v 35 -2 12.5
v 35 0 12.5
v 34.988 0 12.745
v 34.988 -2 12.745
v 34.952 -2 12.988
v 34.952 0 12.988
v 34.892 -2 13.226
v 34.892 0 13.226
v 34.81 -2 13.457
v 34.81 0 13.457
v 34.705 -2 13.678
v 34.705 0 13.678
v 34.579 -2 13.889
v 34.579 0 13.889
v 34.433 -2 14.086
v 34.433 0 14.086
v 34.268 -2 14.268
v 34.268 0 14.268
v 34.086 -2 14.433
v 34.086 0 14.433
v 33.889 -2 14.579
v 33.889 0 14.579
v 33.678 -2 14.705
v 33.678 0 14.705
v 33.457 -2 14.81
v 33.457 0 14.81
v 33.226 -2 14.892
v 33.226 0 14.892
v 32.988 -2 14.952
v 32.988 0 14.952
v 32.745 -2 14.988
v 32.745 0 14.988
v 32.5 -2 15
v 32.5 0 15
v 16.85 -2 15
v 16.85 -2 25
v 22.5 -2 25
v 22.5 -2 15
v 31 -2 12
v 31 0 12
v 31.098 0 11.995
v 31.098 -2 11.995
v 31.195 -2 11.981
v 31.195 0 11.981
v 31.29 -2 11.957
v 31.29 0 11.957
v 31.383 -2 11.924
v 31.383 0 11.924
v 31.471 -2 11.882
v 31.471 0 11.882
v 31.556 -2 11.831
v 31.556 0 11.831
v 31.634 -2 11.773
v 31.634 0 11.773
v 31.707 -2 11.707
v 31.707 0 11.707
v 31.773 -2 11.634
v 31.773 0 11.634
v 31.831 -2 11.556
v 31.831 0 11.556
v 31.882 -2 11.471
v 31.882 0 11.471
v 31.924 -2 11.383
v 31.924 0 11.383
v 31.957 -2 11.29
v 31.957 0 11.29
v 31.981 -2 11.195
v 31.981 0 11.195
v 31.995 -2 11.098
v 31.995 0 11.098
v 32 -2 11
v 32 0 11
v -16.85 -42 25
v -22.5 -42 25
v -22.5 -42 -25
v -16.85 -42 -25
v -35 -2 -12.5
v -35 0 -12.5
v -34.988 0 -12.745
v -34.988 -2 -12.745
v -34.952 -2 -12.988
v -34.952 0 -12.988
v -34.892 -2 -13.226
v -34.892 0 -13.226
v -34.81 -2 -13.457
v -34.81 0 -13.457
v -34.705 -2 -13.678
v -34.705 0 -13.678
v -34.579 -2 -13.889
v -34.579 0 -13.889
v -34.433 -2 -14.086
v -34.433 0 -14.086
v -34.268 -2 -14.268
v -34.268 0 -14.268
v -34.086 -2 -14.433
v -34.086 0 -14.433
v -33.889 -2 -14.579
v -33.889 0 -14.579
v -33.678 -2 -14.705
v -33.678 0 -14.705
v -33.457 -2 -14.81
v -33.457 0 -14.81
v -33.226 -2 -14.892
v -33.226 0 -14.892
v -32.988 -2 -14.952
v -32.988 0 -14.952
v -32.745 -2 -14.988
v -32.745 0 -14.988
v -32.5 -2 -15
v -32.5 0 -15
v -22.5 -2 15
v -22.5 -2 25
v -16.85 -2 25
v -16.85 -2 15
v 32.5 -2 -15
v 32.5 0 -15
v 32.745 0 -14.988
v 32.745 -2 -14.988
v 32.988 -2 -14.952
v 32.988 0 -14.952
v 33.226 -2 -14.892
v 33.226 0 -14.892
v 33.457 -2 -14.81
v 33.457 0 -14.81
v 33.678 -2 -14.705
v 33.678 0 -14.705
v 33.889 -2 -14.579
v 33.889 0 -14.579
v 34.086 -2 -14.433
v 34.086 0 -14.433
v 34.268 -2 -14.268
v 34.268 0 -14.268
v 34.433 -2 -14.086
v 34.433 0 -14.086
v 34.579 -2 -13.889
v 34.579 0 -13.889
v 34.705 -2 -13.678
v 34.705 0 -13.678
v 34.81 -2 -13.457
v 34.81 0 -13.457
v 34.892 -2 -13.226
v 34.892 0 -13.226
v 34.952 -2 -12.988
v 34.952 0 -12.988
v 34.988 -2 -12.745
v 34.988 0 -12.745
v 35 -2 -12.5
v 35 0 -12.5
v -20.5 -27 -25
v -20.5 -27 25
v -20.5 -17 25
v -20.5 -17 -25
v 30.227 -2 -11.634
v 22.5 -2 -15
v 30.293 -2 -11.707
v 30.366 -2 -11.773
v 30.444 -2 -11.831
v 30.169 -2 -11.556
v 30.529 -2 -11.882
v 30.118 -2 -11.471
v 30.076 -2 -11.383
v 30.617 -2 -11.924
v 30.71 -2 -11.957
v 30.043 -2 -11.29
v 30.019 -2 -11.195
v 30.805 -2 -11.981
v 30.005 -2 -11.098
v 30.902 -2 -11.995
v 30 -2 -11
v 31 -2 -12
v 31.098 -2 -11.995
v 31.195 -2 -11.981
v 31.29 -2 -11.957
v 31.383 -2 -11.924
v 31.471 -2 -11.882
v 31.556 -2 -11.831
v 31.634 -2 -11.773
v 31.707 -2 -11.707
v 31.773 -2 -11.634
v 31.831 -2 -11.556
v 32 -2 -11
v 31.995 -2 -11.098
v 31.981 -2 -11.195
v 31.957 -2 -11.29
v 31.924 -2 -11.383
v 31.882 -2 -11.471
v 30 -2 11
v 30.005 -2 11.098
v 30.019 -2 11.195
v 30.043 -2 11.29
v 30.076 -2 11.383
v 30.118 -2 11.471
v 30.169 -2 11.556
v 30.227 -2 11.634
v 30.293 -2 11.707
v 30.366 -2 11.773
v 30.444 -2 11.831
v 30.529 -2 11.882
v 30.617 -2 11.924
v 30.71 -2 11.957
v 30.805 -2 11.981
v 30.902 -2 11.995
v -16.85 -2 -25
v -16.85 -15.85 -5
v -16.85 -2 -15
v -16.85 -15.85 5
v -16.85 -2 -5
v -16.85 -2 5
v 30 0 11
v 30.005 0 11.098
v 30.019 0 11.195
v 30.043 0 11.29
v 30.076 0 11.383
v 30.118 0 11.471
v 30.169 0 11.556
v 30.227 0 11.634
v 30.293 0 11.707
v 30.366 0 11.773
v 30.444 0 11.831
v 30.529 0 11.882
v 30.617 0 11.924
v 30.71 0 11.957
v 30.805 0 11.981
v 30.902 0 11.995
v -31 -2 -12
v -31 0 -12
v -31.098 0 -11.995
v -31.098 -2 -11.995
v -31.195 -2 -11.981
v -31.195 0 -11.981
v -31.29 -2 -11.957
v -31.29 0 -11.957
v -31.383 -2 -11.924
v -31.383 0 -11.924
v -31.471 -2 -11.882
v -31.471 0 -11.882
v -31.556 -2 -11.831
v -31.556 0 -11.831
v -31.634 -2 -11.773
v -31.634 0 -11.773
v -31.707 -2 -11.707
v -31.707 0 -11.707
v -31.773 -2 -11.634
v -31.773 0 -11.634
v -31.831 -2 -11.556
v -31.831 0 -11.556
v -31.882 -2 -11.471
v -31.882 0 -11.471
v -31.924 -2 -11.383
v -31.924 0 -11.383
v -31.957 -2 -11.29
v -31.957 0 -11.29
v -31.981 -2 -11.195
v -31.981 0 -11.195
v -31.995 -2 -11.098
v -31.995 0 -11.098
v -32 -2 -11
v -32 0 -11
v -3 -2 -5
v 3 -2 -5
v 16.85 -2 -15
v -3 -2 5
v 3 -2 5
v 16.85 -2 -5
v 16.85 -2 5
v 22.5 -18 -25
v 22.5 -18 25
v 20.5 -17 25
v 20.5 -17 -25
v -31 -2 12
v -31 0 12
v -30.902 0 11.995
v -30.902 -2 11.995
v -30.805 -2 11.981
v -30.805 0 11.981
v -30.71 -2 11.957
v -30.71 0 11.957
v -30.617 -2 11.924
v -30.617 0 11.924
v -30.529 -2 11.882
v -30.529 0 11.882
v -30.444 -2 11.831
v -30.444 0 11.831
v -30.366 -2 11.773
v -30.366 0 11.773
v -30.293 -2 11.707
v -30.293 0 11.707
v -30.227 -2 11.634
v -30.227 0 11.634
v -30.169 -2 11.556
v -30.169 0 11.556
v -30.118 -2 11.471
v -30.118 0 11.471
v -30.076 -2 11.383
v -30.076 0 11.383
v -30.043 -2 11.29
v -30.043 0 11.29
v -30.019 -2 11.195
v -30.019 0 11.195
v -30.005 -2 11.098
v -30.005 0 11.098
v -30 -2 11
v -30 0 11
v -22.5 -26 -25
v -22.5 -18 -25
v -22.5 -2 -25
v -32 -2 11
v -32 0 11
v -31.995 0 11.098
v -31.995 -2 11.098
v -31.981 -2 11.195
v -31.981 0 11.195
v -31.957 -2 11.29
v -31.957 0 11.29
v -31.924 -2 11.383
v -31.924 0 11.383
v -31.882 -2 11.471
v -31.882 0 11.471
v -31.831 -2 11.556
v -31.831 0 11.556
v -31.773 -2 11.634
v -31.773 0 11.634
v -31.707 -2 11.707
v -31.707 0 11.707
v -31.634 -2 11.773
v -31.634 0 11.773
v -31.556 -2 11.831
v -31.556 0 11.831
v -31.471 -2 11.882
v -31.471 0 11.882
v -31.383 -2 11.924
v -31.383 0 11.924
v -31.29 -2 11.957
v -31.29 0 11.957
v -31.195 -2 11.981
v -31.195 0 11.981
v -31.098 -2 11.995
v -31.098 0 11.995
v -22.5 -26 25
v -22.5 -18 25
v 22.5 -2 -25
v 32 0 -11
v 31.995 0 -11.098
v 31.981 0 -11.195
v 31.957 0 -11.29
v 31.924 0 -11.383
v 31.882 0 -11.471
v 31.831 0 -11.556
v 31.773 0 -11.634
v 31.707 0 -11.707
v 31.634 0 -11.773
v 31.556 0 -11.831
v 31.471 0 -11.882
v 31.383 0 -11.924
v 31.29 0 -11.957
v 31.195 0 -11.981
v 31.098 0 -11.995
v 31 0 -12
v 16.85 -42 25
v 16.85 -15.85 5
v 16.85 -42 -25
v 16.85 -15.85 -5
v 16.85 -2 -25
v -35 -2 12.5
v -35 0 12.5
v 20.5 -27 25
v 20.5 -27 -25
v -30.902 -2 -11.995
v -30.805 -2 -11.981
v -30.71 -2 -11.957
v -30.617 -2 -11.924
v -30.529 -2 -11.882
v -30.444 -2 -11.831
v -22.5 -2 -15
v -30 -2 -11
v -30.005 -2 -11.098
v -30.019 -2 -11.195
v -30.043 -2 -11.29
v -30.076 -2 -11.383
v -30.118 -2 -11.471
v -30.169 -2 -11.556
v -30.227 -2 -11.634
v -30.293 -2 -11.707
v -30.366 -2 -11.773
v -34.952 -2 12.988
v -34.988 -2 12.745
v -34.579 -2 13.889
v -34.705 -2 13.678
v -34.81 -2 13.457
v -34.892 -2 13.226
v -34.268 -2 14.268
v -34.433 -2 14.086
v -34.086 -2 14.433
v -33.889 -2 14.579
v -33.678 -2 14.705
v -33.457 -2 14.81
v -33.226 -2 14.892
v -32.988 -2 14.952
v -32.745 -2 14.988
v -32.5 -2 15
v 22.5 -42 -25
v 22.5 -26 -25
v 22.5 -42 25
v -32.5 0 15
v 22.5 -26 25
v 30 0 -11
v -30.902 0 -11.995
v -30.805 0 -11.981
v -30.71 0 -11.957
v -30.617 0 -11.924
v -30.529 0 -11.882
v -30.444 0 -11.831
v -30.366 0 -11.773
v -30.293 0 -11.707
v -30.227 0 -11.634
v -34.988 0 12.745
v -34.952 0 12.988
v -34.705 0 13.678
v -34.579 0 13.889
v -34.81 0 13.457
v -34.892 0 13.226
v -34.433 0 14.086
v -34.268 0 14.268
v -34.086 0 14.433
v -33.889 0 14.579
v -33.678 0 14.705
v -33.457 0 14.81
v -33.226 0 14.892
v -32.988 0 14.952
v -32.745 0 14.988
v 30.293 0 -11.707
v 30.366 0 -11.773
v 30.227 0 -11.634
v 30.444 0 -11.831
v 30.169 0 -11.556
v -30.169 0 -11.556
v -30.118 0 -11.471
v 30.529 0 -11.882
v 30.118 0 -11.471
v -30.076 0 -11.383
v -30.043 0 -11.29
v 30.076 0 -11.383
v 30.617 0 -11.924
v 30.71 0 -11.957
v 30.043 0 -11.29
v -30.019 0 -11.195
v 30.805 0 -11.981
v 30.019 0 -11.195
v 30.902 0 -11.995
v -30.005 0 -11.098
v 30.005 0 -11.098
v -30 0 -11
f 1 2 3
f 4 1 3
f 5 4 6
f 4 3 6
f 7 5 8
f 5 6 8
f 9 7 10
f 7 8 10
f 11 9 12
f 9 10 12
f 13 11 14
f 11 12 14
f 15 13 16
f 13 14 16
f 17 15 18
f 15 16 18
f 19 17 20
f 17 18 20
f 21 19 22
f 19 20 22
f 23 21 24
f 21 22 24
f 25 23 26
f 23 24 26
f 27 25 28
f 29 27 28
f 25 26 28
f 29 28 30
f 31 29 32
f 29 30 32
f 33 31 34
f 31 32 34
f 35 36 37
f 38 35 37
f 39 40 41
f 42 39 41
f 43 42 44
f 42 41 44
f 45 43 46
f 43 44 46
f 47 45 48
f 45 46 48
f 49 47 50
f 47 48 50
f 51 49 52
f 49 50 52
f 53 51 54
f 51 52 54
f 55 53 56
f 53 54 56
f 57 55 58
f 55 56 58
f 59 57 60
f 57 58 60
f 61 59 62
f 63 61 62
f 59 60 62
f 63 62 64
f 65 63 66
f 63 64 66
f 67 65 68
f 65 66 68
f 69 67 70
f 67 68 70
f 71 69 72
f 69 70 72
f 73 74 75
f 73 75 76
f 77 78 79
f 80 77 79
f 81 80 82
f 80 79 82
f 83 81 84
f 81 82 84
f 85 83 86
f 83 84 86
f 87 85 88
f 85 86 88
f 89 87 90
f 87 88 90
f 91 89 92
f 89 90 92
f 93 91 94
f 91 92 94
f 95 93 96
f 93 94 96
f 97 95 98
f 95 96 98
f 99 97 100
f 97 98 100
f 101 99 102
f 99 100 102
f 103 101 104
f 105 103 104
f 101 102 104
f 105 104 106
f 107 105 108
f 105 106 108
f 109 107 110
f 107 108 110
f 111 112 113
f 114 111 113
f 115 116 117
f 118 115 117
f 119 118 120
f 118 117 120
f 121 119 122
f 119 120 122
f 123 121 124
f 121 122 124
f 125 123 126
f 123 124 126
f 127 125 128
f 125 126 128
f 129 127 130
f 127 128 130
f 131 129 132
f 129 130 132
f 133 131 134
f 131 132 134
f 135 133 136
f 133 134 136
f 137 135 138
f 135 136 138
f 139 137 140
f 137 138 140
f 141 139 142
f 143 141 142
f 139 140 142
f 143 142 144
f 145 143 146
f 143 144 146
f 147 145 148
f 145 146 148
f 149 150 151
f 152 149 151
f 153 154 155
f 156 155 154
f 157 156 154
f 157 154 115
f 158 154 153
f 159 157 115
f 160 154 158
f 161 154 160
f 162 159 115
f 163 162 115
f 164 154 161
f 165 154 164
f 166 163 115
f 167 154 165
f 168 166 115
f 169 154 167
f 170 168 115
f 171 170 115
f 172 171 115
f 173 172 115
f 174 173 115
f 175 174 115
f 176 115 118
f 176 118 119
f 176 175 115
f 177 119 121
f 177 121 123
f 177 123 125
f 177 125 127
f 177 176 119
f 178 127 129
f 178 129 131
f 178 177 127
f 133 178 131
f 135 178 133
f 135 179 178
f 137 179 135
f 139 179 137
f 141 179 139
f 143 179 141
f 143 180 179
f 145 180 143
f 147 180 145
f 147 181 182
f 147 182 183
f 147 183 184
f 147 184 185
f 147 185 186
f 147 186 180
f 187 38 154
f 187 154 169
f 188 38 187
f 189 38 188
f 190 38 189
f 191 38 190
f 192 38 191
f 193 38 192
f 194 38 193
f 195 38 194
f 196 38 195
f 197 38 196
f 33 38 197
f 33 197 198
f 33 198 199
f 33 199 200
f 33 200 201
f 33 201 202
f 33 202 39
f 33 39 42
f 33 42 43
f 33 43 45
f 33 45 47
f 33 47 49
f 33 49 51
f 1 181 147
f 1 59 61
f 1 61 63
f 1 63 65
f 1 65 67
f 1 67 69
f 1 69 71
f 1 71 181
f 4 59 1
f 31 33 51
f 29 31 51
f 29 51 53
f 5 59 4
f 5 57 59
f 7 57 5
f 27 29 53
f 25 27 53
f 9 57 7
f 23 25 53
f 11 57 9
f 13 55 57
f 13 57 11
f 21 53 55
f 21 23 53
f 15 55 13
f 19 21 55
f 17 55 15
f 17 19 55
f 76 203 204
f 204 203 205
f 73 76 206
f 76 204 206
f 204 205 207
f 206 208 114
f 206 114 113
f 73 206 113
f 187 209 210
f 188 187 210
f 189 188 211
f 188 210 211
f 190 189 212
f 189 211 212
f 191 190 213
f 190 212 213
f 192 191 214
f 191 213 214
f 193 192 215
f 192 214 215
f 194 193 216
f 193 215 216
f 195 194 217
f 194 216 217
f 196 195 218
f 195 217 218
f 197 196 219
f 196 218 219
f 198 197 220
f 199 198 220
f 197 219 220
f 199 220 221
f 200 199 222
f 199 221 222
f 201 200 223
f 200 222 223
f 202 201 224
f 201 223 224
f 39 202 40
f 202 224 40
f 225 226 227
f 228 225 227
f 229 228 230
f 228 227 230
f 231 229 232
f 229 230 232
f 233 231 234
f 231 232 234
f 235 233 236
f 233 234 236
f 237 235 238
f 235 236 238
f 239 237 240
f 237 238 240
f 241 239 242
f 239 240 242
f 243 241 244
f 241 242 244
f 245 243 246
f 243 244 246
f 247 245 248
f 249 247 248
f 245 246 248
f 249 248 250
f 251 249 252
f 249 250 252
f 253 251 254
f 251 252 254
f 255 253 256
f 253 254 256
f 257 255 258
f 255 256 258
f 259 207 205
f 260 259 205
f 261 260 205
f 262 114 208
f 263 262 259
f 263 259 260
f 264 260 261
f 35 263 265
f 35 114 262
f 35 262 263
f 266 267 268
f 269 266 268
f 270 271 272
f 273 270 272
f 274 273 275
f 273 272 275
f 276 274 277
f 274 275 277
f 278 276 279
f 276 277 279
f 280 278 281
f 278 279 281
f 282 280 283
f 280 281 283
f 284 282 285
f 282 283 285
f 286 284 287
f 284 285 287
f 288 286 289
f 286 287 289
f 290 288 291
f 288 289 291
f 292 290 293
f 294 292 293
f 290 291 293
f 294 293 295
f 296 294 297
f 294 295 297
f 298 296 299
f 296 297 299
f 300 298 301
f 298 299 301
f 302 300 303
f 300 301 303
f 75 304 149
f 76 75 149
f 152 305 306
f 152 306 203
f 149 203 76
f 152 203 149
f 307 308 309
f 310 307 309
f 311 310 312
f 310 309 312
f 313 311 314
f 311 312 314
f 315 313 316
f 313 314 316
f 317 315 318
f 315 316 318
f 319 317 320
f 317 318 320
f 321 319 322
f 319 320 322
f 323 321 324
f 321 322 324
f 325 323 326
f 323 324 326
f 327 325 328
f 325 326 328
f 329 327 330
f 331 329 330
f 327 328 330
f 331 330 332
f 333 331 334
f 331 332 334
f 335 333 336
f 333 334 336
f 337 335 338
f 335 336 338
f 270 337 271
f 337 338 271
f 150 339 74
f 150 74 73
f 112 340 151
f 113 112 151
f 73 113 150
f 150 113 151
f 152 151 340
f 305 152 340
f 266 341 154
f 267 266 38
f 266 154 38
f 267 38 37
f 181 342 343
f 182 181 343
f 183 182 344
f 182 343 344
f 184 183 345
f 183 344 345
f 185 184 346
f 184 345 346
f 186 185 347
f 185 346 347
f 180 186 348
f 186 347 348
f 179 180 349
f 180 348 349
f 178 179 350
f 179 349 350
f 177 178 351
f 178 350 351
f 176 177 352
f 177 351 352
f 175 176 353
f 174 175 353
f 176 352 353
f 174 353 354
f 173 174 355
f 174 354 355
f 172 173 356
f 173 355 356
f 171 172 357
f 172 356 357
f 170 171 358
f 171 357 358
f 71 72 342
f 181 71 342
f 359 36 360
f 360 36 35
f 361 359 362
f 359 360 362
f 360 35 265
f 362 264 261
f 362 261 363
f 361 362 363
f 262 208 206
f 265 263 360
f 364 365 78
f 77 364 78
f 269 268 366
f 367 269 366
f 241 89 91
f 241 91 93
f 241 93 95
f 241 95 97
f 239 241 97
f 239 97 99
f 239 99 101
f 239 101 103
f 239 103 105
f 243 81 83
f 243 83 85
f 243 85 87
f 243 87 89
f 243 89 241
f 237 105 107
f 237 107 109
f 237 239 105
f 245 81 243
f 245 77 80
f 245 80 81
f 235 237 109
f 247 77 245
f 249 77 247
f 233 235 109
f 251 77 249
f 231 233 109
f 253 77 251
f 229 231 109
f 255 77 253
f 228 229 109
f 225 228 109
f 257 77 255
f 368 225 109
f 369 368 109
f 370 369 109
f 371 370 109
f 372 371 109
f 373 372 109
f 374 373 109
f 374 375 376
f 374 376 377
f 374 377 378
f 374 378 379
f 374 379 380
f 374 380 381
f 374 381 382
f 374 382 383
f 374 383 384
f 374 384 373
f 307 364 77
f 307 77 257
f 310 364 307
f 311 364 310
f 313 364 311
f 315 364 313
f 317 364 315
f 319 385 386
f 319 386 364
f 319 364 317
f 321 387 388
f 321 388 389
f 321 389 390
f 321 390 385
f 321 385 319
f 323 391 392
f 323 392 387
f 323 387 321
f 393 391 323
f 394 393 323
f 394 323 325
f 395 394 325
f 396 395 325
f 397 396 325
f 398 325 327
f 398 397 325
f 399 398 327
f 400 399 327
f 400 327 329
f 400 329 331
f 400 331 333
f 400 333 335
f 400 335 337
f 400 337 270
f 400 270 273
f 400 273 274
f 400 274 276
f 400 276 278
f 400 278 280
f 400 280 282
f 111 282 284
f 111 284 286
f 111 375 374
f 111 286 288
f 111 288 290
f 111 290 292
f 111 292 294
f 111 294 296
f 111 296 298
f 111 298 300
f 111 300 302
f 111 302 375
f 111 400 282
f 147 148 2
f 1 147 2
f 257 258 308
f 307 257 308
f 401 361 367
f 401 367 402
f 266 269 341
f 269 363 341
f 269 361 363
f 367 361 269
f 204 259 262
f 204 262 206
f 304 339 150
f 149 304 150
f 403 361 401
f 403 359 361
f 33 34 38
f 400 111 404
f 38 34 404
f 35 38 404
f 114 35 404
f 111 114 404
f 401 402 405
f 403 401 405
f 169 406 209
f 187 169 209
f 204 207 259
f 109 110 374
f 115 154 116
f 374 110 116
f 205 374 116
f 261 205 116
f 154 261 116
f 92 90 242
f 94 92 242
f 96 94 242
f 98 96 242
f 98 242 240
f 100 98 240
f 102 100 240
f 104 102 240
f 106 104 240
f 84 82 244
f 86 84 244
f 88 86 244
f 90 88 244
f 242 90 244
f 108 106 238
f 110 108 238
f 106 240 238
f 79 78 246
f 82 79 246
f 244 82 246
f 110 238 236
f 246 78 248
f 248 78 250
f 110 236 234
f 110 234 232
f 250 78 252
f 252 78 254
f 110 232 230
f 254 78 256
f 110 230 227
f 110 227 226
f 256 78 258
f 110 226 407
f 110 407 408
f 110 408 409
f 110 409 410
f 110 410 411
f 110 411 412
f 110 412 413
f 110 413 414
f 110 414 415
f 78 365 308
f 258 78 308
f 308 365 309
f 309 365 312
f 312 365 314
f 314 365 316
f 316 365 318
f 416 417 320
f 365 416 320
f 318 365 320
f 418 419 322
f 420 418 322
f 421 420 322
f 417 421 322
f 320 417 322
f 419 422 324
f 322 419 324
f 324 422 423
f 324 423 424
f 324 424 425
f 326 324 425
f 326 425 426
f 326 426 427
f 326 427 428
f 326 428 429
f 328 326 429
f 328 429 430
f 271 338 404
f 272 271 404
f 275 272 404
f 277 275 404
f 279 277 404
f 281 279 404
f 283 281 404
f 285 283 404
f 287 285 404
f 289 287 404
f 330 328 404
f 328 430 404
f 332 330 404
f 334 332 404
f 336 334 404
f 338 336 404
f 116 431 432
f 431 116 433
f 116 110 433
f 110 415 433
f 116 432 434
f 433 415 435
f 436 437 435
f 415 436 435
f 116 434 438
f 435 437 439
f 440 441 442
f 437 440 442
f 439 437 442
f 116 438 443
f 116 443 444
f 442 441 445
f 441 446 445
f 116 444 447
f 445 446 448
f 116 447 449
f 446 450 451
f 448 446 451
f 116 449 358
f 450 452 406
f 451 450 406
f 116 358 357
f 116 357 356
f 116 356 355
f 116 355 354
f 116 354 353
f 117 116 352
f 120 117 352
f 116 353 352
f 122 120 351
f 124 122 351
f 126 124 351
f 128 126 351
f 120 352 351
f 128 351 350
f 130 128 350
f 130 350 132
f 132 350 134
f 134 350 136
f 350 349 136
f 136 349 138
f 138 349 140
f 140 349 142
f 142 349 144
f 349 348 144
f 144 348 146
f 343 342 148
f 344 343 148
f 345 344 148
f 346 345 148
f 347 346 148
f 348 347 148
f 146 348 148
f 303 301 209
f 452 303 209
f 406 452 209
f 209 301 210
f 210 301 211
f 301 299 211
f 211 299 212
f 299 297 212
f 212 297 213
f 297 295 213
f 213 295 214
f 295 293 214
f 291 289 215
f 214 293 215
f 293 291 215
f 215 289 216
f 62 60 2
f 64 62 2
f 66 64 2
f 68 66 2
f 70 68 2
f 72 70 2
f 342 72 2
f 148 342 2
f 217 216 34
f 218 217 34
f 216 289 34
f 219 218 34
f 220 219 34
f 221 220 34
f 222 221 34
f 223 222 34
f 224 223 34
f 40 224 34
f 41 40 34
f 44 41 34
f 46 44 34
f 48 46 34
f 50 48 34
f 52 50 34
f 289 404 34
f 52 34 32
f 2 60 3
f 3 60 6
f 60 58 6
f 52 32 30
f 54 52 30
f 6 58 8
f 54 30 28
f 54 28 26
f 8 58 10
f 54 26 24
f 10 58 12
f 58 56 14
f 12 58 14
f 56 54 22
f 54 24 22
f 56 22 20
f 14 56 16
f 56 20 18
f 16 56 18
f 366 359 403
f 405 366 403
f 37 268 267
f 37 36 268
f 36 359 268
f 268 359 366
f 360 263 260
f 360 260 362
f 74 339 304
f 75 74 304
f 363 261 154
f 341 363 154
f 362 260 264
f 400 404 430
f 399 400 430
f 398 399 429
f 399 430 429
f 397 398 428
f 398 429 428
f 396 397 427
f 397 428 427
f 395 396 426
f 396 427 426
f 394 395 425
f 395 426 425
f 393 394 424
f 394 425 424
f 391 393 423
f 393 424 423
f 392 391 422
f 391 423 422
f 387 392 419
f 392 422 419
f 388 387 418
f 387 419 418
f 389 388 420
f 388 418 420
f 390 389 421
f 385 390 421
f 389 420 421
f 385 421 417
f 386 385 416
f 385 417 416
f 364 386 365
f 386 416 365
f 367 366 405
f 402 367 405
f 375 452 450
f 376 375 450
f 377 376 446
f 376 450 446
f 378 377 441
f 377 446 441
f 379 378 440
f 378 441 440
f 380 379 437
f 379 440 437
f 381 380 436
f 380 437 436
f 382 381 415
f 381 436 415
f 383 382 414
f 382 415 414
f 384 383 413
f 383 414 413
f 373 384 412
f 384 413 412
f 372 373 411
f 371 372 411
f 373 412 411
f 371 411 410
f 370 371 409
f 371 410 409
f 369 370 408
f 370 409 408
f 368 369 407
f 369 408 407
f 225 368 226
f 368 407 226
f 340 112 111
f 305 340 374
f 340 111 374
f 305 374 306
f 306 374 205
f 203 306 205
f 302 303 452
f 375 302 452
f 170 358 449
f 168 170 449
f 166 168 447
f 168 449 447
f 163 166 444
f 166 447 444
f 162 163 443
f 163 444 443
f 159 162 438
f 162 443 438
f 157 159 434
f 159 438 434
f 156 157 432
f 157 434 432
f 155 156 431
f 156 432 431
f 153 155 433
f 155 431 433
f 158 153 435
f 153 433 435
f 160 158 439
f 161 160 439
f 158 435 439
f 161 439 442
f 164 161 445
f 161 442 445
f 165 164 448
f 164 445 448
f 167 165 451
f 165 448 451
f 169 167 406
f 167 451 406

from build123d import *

# Parameters (mm, degrees)
F1_DEPTH      = 2
F2_W          = 5.6501800592
F2_H          = 10
F2_H_2        = 30
F3_DEPTH      = 40
F5_DEPTH      = 50
F7_DEPTH      = 50
F8_W          = 13.8498199408
F8_H          = 10
F9_DEPTH      = 15
F10_T4_DEPTH  = 87.150489639
F10_T10_DEPTH = 87.150489639


# Not quite as in the source:
# - a fillet or chamfer that OpenCascade refuses, or shapes differently, is made with other operations: its cross-section is extruded or revolved along the edge and cut away or added


with BuildPart() as f1:
    # F0 (on Front) → F1 (new body)
    with BuildSketch(Plane.XZ):
        with BuildLine():
            Line((32.5, 15), (-32.5, 15))
            ThreePointArc((-32.5, 15), (-34.267766953, 14.267766953), (-35, 12.5))
            Line((-35, 12.5), (-35, -12.5))
            ThreePointArc((-35, -12.5), (-34.267766953, -14.267766953), (-32.5, -15))
            Line((-32.5, -15), (32.5, -15))
            ThreePointArc((32.5, -15), (34.267766953, -14.267766953), (35, -12.5))
            Line((35, -12.5), (35, 12.5))
            ThreePointArc((35, 12.5), (34.267766953, 14.267766953), (32.5, 15))
        make_face()
        with BuildLine():
            Line((-32, -11), (-32, 11))
            ThreePointArc((-32, 11), (-31.7071067812, 11.7071067812), (-31, 12))
            ThreePointArc((-31, 12), (-30.2928932188, 11.7071067812), (-30, 11))
            Line((-30, 11), (-30, -11))
            ThreePointArc((-30, -11), (-30.2928932188, -11.7071067812), (-31, -12))
            ThreePointArc((-31, -12), (-31.7071067812, -11.7071067812), (-32, -11))
        make_face(mode=Mode.SUBTRACT)
        with BuildLine():
            Line((30, -11), (30, 11))
            ThreePointArc((30, 11), (30.2928932188, 11.7071067812), (31, 12))
            ThreePointArc((31, 12), (31.7071067812, 11.7071067812), (32, 11))
            Line((32, 11), (32, -11))
            ThreePointArc((32, -11), (31.7071067812, -11.7071067812), (31, -12))
            ThreePointArc((31, -12), (30.2928932188, -11.7071067812), (30, -11))
        make_face(mode=Mode.SUBTRACT)
    extrude(amount=F1_DEPTH)

    # F2 (on face) → F3 (join)
    with BuildSketch(Plane.XZ.offset(2)):
        with Locations((-19.6749099704, 20)):
            Rectangle(F2_W, F2_H)
        with Locations((-19.6749099704, 0)):
            Rectangle(F2_W, F2_H_2)
        with Locations((-19.6749099704, -20)):
            Rectangle(F2_W, F2_H)
        with Locations((19.6749099704, -20)):
            Rectangle(F2_W, F2_H)
        with Locations((19.6749099704, 0)):
            Rectangle(F2_W, F2_H_2)
        with Locations((19.6749099704, 20)):
            Rectangle(F2_W, F2_H)
    extrude(amount=F3_DEPTH)

    # F4 (on face) → F5 (cut, through all)
    with BuildSketch(Plane.XY.offset(25)):
        Polygon((-20.5, -17), (-22.5, -18), (-22.5, -26), (-20.5, -27), (-20.5, -26), (-20.5, -18), align=None)
    extrude(amount=-F5_DEPTH, mode=Mode.SUBTRACT)

    # F6 (on face) → F7 (cut, through all)
    with BuildSketch(Plane.XY.offset(25)):
        Polygon((22.5, -26), (22.5, -18), (20.5, -17), (20.5, -18), (20.5, -26), (20.5, -27), align=None)
    extrude(amount=-F7_DEPTH, mode=Mode.SUBTRACT)

    # F8 (on face) → F9 (join)
    with BuildSketch(Plane.XZ.offset(2)):
        with Locations((-9.9249099704, 0)):
            Rectangle(F8_W, F8_H)
        with Locations((9.9249099704, 0)):
            Rectangle(F8_W, F8_H)
    extrude(amount=F9_DEPTH)

    # F10: chamfer of 15 on 2 edges, made by hand


with BuildPart() as f10_tool2:
    # F10_s3 → F10_t4 (new body)
    with BuildSketch(Plane.XY.offset(-43.5752448195)):
        Polygon((-3, -2), (-18, -17), (-3, -17), align=None)
    extrude(amount=F10_T4_DEPTH)

    split(bisect_by=Plane.XZ.offset(2), keep=Keep.TOP)

    split(bisect_by=Plane.YZ.offset(-16.8498199408), keep=Keep.TOP)


with BuildPart() as f1_1:
    add(f1.part)

    # F10_t1: cut F10_tool2
    add(f10_tool2.part, mode=Mode.SUBTRACT)


with BuildPart() as f10_tool8:
    # F10_s9 → F10_t10 (new body)
    with BuildSketch(Plane.XY.offset(43.5752448195)):
        Polygon((3, -2), (18, -17), (3, -17), align=None)
    extrude(amount=-F10_T10_DEPTH)

    split(bisect_by=Plane.XZ.offset(2), keep=Keep.TOP)

    split(bisect_by=Plane.YZ.offset(16.8498199408), keep=Keep.BOTTOM)


with BuildPart() as f1_2:
    add(f1_1.part)

    # F10_t7: cut F10_tool8
    add(f10_tool8.part, mode=Mode.SUBTRACT)


solid = f1_2.part
